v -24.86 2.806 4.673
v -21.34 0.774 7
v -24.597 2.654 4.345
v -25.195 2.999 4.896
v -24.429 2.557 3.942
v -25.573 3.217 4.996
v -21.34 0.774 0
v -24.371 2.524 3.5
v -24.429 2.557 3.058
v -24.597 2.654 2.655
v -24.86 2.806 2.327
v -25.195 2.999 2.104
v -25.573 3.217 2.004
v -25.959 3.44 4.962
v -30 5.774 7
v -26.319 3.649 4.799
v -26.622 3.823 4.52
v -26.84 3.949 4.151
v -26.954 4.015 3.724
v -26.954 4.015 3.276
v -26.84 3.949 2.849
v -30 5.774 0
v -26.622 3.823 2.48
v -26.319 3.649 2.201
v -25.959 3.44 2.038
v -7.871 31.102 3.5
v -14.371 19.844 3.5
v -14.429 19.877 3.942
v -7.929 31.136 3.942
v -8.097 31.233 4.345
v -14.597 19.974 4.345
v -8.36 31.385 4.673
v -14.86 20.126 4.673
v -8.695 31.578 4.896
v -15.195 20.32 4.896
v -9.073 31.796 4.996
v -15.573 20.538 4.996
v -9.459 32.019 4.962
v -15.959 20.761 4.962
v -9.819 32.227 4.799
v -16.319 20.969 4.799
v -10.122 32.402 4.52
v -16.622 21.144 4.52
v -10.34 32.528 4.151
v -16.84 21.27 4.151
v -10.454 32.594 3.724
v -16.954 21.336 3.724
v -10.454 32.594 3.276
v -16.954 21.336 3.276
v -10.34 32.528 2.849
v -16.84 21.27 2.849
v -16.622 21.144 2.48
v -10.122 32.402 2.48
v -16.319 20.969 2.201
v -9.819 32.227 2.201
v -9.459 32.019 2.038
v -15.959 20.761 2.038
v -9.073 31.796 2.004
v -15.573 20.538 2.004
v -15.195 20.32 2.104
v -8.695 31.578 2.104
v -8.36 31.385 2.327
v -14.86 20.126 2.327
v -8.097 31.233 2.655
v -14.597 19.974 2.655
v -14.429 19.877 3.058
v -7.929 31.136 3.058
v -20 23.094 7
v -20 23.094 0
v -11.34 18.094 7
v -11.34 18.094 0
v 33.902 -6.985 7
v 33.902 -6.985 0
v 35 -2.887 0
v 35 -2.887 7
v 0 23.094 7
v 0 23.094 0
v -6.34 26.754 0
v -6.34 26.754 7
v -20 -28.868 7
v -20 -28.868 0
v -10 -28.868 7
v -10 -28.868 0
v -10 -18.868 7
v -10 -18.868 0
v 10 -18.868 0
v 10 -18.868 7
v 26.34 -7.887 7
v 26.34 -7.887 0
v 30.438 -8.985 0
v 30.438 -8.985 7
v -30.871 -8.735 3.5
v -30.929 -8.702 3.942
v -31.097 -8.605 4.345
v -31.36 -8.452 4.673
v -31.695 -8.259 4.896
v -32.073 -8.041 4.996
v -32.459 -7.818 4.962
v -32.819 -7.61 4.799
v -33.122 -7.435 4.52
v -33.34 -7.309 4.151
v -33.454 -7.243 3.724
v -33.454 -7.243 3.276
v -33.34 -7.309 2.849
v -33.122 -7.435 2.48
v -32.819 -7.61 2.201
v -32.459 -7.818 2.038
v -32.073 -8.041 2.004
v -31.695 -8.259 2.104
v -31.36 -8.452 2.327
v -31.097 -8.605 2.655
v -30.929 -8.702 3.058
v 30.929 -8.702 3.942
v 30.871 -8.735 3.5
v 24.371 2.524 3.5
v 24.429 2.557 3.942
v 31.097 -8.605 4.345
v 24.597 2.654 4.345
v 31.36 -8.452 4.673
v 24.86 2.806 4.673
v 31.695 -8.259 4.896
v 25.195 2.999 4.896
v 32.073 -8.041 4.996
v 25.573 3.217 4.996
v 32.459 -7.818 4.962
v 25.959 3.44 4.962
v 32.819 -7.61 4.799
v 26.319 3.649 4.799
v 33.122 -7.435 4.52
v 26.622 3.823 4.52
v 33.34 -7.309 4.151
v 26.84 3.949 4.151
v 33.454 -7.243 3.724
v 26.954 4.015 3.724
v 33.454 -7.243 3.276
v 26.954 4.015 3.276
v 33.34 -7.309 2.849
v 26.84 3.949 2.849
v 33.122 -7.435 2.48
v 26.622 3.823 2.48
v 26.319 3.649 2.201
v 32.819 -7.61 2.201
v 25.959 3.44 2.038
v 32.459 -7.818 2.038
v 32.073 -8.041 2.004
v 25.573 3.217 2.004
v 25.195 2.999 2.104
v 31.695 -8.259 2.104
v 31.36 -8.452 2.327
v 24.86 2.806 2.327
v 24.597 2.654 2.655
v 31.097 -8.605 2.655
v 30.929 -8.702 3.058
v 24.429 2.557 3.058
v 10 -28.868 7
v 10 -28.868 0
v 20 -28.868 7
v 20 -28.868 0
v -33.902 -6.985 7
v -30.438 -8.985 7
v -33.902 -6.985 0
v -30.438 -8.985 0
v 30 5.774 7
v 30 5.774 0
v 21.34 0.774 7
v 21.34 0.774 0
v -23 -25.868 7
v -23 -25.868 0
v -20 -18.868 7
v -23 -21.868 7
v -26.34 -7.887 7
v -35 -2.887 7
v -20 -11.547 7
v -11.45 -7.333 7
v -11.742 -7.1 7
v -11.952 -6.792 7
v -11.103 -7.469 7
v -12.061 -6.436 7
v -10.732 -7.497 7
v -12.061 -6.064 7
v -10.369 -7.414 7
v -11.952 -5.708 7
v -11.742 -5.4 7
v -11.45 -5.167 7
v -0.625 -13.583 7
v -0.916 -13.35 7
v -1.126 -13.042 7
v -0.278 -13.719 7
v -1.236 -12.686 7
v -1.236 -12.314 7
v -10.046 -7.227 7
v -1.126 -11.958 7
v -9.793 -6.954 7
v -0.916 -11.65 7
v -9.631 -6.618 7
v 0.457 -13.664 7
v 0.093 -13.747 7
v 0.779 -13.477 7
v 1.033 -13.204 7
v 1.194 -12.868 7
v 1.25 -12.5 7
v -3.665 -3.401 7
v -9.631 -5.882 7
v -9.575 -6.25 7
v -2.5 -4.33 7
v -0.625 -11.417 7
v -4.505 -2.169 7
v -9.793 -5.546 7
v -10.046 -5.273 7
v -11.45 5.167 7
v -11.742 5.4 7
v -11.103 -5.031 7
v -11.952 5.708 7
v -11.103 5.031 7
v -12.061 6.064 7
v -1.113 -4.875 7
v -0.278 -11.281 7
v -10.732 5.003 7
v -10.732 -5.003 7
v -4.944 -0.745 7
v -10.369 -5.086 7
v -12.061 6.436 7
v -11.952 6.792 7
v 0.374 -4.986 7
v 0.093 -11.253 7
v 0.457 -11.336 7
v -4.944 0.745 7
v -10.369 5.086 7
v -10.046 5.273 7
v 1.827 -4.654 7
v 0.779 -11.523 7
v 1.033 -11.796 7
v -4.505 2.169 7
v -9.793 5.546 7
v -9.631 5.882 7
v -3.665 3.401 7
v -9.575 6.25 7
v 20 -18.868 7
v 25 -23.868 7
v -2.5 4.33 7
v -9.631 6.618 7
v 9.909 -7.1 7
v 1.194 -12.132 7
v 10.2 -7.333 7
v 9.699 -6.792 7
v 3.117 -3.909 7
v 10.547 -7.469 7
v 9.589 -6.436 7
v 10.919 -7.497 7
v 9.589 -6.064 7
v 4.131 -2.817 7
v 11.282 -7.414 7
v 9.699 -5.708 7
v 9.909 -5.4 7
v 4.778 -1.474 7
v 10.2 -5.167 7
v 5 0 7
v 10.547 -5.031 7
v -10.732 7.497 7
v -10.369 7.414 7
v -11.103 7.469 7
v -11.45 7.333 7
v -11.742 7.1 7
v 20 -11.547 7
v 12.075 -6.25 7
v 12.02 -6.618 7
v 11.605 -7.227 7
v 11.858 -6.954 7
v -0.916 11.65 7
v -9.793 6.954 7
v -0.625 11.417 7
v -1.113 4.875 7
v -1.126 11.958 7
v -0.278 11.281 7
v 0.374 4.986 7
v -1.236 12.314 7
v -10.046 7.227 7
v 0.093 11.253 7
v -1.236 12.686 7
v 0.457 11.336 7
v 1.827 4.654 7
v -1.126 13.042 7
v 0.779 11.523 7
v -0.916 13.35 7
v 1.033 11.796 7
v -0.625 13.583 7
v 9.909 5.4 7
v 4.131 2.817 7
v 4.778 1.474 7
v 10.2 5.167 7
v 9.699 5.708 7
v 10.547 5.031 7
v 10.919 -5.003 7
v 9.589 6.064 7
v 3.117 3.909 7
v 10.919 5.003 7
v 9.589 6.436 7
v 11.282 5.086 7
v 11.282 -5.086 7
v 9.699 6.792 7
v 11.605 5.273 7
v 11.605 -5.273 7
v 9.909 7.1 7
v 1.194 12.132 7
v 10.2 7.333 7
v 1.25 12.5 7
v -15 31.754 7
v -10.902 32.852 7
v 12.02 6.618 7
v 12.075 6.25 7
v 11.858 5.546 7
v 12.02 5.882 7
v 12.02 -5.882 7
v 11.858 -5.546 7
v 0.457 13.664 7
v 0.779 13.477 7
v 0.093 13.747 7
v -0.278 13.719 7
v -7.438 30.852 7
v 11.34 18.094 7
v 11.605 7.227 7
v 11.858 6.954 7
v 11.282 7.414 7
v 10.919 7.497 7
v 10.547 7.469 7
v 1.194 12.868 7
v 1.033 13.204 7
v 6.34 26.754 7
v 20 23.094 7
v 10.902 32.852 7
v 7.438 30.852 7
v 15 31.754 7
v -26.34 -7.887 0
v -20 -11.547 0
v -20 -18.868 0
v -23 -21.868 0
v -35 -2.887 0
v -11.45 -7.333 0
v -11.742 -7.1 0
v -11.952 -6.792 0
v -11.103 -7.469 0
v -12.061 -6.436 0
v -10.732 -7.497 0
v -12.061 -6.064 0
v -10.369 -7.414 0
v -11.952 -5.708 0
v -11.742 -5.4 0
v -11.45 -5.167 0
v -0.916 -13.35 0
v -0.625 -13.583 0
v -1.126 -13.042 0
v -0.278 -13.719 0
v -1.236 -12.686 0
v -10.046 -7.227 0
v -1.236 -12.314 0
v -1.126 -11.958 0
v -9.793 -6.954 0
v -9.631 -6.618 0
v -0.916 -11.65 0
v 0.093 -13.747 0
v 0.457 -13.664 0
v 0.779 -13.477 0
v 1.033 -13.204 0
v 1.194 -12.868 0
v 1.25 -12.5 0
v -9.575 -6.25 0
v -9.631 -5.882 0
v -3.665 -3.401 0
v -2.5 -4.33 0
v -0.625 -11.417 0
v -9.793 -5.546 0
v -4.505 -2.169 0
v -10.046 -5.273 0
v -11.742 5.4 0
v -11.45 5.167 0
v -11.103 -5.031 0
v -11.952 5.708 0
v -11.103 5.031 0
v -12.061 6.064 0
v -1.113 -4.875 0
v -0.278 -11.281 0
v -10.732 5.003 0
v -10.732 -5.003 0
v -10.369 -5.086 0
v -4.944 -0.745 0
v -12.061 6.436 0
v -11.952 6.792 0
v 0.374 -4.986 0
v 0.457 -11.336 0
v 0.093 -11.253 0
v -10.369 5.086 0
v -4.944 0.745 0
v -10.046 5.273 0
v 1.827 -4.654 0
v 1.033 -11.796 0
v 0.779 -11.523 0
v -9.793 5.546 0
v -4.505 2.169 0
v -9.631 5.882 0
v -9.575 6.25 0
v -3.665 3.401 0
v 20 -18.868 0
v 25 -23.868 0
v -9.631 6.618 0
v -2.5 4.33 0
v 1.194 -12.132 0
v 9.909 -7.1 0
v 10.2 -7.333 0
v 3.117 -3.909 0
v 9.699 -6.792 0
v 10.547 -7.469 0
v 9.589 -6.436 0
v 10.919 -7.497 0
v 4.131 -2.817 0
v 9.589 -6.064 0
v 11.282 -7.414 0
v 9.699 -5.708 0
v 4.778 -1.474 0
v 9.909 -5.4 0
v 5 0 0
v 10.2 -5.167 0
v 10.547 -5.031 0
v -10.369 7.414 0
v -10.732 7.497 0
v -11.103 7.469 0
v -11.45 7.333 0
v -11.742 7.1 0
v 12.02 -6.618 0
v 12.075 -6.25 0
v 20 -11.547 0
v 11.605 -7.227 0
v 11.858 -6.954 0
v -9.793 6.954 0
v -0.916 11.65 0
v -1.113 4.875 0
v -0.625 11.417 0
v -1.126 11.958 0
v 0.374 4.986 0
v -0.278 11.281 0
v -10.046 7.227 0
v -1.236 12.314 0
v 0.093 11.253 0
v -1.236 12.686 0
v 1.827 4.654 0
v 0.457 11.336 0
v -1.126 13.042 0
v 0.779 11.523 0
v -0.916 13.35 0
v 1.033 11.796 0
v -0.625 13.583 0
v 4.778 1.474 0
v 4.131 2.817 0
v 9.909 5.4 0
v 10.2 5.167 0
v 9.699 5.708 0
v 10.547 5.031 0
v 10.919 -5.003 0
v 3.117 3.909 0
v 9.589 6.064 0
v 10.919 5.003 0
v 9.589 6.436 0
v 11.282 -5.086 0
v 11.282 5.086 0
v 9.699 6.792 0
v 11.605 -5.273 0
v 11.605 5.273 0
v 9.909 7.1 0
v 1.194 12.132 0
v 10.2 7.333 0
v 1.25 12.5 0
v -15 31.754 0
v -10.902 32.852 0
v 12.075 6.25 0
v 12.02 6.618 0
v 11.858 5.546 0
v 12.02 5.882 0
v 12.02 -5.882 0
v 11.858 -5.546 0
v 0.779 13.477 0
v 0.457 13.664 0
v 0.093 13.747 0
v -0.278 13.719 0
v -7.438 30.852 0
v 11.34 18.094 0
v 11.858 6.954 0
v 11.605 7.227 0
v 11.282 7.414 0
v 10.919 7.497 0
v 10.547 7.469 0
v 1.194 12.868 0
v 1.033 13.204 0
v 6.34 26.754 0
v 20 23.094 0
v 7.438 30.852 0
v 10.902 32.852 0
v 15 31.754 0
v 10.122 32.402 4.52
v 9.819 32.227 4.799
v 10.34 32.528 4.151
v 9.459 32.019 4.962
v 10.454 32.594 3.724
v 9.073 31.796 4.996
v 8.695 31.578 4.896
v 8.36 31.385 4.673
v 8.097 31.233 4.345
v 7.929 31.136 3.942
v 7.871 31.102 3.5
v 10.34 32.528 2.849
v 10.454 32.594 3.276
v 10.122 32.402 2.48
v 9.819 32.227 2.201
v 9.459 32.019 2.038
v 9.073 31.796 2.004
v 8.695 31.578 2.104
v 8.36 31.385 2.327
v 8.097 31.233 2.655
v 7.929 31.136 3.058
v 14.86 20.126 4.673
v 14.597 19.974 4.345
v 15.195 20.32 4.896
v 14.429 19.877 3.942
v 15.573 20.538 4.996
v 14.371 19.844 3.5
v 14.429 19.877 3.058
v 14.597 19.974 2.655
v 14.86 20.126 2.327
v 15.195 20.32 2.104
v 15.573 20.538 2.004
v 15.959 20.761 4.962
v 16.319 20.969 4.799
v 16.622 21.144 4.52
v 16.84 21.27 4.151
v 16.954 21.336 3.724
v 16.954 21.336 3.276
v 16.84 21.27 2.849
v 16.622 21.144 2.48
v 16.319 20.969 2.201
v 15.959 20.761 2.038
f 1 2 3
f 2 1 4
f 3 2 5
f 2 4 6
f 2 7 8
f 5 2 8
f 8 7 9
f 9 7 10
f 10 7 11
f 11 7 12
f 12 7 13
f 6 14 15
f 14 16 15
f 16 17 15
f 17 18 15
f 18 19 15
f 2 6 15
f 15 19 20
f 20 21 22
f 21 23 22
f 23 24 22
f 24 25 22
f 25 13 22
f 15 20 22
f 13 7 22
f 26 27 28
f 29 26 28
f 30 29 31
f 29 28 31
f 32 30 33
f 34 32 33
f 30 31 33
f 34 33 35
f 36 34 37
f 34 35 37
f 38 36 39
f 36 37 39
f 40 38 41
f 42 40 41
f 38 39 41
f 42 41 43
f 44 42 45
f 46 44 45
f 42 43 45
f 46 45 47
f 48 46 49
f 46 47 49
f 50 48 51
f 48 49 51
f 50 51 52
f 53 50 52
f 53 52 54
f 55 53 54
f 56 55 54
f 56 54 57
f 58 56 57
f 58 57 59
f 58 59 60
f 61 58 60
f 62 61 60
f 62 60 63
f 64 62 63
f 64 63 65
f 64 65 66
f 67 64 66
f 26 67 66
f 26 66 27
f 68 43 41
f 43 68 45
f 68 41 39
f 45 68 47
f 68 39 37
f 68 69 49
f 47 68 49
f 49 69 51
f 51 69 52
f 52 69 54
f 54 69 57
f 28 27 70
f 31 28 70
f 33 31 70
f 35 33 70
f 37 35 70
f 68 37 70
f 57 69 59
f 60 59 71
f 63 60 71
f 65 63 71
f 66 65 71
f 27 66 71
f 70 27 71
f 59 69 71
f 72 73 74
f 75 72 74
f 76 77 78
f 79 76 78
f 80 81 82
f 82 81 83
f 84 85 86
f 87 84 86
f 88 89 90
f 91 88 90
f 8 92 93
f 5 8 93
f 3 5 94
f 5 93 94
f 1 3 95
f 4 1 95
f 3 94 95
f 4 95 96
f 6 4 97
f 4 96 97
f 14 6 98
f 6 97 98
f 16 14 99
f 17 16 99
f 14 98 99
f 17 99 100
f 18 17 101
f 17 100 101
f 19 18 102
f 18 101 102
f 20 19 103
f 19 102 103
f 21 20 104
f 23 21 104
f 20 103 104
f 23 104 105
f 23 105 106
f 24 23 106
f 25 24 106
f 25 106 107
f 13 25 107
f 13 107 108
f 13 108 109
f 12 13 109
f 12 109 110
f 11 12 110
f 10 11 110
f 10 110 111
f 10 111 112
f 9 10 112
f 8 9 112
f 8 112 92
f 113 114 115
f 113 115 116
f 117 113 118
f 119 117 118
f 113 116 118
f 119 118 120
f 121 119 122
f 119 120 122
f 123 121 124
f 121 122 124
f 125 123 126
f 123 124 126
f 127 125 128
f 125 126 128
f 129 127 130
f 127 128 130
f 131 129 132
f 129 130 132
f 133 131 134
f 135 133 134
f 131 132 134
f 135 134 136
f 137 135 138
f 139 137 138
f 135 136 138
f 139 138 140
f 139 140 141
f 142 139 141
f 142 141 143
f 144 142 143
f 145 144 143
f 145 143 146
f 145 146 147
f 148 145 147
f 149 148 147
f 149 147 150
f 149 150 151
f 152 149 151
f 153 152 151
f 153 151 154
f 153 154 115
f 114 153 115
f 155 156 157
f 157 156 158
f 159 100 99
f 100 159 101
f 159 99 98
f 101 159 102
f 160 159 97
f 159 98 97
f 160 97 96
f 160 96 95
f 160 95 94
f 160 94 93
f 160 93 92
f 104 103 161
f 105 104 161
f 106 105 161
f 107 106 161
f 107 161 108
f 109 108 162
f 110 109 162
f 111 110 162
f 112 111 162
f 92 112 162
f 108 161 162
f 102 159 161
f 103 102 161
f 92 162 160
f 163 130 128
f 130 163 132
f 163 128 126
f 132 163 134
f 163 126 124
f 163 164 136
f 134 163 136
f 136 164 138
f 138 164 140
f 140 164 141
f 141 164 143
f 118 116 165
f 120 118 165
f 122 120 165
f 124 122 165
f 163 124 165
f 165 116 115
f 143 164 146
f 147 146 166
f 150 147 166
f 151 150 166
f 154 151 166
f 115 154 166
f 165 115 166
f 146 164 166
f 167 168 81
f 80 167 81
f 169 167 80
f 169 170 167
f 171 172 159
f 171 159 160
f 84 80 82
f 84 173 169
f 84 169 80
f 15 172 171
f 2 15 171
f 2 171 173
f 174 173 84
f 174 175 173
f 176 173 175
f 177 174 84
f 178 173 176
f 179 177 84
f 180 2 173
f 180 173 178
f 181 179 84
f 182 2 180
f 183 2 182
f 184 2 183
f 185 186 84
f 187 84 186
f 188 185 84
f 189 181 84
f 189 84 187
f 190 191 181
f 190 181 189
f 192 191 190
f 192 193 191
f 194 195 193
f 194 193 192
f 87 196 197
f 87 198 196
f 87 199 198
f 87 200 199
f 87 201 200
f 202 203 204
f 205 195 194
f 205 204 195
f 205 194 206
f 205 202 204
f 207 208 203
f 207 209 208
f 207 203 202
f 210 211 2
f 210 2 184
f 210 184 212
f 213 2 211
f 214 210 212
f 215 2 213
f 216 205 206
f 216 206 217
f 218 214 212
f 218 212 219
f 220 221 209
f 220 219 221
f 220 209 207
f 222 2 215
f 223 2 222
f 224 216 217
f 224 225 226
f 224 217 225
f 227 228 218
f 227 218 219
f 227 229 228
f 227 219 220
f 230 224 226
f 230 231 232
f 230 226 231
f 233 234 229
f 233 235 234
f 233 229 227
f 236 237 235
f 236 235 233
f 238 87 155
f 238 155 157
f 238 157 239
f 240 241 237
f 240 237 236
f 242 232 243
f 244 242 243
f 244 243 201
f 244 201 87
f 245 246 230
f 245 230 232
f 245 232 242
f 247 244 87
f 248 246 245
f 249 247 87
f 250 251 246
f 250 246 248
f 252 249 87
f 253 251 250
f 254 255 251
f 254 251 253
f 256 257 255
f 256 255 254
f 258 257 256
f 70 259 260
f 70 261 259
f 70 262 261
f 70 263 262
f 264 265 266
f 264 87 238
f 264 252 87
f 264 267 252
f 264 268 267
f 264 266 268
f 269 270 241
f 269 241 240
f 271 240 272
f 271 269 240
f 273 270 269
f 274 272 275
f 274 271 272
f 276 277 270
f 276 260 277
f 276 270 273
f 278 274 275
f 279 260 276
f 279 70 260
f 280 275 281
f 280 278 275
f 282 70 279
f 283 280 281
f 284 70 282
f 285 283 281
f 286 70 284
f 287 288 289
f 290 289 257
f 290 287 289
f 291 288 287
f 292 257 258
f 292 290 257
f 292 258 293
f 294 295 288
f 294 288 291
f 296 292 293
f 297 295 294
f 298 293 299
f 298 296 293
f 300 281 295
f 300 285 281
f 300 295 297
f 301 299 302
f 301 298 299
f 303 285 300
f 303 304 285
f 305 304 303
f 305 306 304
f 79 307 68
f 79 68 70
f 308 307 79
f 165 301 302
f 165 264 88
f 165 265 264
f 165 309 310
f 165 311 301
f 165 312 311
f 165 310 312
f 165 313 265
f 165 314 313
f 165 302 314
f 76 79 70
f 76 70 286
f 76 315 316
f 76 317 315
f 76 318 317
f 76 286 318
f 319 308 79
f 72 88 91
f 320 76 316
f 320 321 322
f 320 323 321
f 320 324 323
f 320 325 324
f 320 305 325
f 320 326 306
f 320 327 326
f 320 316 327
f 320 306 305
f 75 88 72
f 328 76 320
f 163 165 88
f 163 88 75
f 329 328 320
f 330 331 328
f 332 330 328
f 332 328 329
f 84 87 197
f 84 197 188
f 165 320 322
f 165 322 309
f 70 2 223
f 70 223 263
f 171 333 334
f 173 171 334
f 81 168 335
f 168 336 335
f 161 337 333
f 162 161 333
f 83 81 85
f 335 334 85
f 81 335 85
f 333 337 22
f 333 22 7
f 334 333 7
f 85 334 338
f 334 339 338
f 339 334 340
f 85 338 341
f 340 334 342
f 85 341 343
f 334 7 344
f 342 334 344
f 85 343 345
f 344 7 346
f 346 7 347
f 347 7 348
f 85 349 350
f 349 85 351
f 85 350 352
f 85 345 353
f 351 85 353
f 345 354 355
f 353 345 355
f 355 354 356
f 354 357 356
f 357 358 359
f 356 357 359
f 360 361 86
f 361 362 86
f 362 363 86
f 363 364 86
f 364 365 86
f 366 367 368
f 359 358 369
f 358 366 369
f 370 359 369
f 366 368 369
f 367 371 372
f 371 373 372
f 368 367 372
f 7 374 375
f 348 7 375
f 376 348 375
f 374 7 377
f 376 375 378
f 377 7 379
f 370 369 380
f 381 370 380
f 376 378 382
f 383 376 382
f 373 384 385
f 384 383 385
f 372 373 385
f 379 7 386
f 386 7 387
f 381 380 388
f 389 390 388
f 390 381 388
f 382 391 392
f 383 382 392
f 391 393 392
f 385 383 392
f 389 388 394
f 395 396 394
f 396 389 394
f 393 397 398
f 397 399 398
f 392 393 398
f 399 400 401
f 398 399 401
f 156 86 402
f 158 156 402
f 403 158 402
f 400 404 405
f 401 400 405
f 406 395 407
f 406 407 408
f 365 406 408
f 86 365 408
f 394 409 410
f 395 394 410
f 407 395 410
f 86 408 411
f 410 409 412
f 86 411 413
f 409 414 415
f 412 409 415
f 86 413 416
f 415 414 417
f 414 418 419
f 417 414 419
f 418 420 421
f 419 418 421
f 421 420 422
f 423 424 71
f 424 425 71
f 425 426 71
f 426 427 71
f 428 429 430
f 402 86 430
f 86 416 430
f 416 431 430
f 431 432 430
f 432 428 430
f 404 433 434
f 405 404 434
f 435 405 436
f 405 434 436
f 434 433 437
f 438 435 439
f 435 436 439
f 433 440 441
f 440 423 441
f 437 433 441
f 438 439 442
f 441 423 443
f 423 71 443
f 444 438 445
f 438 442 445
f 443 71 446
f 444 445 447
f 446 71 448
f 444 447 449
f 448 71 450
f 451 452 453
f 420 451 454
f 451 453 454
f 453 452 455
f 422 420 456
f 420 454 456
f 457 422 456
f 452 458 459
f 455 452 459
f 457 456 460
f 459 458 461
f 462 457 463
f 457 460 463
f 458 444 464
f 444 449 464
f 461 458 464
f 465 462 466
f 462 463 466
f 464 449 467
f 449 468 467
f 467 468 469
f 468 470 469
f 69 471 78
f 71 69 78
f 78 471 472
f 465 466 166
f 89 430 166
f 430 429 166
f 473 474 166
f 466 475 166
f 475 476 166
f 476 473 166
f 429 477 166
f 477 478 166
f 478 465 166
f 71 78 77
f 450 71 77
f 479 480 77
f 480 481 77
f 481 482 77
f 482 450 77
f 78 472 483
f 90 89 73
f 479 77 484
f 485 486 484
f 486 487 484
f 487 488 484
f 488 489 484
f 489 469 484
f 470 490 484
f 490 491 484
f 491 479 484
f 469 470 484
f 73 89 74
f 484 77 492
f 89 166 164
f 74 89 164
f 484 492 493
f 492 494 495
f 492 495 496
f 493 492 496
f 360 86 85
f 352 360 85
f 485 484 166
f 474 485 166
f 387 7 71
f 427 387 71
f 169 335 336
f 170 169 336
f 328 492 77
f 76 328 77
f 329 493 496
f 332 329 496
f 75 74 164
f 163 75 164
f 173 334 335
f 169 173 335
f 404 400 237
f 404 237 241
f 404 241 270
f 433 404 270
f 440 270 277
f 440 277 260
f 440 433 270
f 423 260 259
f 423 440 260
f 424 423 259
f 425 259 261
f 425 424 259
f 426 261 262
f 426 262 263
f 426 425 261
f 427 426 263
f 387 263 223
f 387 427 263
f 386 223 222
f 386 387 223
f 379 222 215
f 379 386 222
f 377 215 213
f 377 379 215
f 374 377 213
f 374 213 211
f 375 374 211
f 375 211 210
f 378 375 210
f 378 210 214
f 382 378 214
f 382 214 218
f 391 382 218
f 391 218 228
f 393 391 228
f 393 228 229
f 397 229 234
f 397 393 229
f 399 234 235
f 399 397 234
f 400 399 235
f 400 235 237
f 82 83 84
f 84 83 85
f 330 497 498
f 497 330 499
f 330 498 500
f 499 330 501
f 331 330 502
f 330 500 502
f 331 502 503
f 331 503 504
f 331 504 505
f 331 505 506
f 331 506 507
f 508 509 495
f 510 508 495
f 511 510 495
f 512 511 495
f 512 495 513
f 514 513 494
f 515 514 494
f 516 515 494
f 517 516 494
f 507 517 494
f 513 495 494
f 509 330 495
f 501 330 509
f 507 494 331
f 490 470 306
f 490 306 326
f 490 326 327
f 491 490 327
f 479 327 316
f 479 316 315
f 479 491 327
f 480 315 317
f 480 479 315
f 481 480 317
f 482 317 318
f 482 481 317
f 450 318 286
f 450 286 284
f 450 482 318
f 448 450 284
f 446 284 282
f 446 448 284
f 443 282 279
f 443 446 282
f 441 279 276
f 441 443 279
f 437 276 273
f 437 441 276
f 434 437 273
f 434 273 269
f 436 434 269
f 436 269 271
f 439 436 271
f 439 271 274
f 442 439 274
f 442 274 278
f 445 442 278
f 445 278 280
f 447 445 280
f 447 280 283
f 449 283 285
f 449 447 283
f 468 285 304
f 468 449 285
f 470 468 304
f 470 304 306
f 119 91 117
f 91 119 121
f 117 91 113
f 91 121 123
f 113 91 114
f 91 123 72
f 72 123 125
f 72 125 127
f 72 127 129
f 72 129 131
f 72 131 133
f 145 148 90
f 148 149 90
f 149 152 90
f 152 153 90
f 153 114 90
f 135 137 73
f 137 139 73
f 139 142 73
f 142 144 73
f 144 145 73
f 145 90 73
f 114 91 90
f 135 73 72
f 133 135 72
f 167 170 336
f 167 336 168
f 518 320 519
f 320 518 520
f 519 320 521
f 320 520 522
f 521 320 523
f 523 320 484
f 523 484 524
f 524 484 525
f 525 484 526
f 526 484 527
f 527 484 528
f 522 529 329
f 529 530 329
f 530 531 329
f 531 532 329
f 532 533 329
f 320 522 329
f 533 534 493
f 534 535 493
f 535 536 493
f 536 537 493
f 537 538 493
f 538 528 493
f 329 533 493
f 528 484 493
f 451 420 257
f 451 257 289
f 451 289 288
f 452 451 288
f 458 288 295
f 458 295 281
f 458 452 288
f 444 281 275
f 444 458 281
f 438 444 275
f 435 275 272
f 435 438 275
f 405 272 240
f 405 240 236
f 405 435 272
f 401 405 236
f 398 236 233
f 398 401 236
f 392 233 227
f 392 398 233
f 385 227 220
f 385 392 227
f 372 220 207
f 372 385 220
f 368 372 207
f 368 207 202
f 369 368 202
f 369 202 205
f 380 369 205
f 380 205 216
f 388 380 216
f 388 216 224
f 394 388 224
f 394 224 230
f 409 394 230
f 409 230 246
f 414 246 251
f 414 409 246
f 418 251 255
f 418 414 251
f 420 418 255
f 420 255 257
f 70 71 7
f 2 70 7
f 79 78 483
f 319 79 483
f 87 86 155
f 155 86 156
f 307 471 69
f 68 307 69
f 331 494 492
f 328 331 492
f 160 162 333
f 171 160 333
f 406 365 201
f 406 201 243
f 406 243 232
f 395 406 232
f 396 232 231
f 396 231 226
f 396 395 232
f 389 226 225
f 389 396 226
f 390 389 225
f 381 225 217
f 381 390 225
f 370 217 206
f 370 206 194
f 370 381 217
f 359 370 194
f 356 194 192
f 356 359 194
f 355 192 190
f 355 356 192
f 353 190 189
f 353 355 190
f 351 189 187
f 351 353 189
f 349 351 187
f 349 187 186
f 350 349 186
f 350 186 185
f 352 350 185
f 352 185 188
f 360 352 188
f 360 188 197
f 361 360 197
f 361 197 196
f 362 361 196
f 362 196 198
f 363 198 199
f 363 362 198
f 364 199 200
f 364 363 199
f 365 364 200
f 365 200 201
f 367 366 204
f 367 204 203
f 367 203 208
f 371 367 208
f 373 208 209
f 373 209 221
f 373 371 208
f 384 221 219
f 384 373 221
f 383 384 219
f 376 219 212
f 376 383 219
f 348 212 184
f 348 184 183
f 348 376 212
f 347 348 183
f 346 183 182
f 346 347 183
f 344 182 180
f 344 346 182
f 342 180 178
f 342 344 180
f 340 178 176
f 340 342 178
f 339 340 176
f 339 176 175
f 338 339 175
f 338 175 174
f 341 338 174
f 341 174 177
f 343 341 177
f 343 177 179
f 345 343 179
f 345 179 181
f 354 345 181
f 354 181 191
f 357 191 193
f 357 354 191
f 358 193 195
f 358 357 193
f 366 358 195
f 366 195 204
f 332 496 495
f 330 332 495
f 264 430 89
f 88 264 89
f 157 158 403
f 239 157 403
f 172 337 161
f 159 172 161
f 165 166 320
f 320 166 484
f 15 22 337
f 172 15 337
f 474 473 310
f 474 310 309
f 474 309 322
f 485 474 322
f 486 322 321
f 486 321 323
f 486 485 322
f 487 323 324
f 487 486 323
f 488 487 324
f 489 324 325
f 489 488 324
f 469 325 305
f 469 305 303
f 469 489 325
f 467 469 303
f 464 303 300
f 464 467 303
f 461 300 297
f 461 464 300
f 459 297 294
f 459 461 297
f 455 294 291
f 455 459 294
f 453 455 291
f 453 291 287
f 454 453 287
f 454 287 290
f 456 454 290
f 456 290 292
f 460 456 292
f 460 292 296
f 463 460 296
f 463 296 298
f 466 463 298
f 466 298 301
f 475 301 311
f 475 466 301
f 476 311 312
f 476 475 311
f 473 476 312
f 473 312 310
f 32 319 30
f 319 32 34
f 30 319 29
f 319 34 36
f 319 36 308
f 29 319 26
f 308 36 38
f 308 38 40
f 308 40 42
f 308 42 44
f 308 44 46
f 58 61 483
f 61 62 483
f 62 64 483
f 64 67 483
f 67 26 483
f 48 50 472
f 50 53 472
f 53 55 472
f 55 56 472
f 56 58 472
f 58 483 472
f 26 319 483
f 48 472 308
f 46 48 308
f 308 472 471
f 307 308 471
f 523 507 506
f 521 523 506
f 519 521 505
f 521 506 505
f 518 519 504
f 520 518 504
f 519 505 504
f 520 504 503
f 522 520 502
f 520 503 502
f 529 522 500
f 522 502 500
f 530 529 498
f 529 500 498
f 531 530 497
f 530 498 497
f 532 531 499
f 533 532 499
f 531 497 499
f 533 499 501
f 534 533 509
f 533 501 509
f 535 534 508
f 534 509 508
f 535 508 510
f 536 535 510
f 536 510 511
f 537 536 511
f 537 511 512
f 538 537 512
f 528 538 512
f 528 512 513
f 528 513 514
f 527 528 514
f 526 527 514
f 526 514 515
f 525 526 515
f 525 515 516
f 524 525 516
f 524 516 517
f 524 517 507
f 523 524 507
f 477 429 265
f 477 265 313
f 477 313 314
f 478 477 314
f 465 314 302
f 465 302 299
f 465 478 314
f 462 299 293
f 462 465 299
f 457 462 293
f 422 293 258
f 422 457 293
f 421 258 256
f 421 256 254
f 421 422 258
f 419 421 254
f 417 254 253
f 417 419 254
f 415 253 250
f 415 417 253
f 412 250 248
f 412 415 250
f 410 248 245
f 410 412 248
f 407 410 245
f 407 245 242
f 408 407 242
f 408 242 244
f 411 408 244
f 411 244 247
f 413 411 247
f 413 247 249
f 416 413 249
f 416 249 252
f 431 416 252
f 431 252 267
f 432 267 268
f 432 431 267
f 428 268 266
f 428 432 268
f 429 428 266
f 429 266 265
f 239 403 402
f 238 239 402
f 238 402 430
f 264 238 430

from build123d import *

# Parameters (mm, degrees)
F0_R     = 1.25
F0_R_2   = 5
F1_DEPTH = 7
F2_R     = 1.5
F3_DEPTH = 46
F4_R     = 1.5
F5_DEPTH = 46


with BuildPart() as f1:
    # F0 (on Top) → F1 (new body)
    with BuildSketch(Plane.XY):
        Polygon((-23, -25.8675134595), (-20, -28.8675134595), (-10, -28.8675134595), (-10, -18.8675134595), (10, -18.8675134595), (10, -28.8675134595), (20, -28.8675134595), (20, -18.8675134595), (20, -11.5470053838), (26.3397459622, -7.8867513459), (30.4378221735, -8.9848275573), (33.9019237886, -6.9848275573), (35, -2.8867513459), (30, 5.7735026919), (21.3397459622, 0.7735026919), (11.3397459622, 18.0940107676), (20, 23.0940107676), (15, 31.7542648054), (10.9019237886, 32.8523410168), (7.4378221735, 30.8523410168), (6.3397459622, 26.7542648054), (0, 23.0940107676), (-6.3397459622, 26.7542648054), (-7.4378221735, 30.8523410168), (-10.9019237886, 32.8523410168), (-15, 31.7542648054), (-20, 23.0940107676), (-11.3397459622, 18.0940107676), (-21.3397459622, 0.7735026919), (-30, 5.7735026919), (-35, -2.8867513459), (-33.9019237886, -6.9848275573), (-30.4378221735, -8.9848275573), (-26.3397459622, -7.8867513459), (-20, -11.5470053838), (-20, -18.8675134595), (-23, -21.8675134595), align=None)
        with Locations((-10.8253175473, -6.25)):
            Circle(F0_R, mode=Mode.SUBTRACT)
        with Locations((0, -12.5)):
            Circle(F0_R, mode=Mode.SUBTRACT)
        with Locations((10.8253175473, -6.25)):
            Circle(F0_R, mode=Mode.SUBTRACT)
        Circle(F0_R_2, mode=Mode.SUBTRACT)
        with Locations((-10.8253175473, 6.25)):
            Circle(F0_R, mode=Mode.SUBTRACT)
        with Locations((10.8253175473, 6.25)):
            Circle(F0_R, mode=Mode.SUBTRACT)
        with Locations((0, 12.5)):
            Circle(F0_R, mode=Mode.SUBTRACT)
        Polygon((23, -21.8675134595), (23, -25.8675134595), (25, -23.8675134595), align=None)
        Polygon((20, -18.8675134595), (20, -28.8675134595), (23, -25.8675134595), (23, -21.8675134595), align=None)
    extrude(amount=F1_DEPTH)

    # F2 (on face) → F3 (cut)
    with BuildSketch(Plane(origin=(-11.5, -19.918584287, 0), x_dir=(0.8660254038, -0.5, 0), z_dir=(-0.5, -0.8660254038, 0))):
        with Locations((-23.8675134595, 3.5)):
            Circle(F2_R)
    extrude(amount=-F3_DEPTH, mode=Mode.SUBTRACT)

    # F4 (on face) → F5 (cut)
    with BuildSketch(Plane(origin=(-11.5, 19.918584287, 0), x_dir=(-0.8660254038, -0.5, 0), z_dir=(-0.5, 0.8660254038, 0))):
        with Locations((-23.8675134595, 3.5)):
            Circle(F4_R)
    extrude(amount=-F5_DEPTH, mode=Mode.SUBTRACT)


solid = f1.part
